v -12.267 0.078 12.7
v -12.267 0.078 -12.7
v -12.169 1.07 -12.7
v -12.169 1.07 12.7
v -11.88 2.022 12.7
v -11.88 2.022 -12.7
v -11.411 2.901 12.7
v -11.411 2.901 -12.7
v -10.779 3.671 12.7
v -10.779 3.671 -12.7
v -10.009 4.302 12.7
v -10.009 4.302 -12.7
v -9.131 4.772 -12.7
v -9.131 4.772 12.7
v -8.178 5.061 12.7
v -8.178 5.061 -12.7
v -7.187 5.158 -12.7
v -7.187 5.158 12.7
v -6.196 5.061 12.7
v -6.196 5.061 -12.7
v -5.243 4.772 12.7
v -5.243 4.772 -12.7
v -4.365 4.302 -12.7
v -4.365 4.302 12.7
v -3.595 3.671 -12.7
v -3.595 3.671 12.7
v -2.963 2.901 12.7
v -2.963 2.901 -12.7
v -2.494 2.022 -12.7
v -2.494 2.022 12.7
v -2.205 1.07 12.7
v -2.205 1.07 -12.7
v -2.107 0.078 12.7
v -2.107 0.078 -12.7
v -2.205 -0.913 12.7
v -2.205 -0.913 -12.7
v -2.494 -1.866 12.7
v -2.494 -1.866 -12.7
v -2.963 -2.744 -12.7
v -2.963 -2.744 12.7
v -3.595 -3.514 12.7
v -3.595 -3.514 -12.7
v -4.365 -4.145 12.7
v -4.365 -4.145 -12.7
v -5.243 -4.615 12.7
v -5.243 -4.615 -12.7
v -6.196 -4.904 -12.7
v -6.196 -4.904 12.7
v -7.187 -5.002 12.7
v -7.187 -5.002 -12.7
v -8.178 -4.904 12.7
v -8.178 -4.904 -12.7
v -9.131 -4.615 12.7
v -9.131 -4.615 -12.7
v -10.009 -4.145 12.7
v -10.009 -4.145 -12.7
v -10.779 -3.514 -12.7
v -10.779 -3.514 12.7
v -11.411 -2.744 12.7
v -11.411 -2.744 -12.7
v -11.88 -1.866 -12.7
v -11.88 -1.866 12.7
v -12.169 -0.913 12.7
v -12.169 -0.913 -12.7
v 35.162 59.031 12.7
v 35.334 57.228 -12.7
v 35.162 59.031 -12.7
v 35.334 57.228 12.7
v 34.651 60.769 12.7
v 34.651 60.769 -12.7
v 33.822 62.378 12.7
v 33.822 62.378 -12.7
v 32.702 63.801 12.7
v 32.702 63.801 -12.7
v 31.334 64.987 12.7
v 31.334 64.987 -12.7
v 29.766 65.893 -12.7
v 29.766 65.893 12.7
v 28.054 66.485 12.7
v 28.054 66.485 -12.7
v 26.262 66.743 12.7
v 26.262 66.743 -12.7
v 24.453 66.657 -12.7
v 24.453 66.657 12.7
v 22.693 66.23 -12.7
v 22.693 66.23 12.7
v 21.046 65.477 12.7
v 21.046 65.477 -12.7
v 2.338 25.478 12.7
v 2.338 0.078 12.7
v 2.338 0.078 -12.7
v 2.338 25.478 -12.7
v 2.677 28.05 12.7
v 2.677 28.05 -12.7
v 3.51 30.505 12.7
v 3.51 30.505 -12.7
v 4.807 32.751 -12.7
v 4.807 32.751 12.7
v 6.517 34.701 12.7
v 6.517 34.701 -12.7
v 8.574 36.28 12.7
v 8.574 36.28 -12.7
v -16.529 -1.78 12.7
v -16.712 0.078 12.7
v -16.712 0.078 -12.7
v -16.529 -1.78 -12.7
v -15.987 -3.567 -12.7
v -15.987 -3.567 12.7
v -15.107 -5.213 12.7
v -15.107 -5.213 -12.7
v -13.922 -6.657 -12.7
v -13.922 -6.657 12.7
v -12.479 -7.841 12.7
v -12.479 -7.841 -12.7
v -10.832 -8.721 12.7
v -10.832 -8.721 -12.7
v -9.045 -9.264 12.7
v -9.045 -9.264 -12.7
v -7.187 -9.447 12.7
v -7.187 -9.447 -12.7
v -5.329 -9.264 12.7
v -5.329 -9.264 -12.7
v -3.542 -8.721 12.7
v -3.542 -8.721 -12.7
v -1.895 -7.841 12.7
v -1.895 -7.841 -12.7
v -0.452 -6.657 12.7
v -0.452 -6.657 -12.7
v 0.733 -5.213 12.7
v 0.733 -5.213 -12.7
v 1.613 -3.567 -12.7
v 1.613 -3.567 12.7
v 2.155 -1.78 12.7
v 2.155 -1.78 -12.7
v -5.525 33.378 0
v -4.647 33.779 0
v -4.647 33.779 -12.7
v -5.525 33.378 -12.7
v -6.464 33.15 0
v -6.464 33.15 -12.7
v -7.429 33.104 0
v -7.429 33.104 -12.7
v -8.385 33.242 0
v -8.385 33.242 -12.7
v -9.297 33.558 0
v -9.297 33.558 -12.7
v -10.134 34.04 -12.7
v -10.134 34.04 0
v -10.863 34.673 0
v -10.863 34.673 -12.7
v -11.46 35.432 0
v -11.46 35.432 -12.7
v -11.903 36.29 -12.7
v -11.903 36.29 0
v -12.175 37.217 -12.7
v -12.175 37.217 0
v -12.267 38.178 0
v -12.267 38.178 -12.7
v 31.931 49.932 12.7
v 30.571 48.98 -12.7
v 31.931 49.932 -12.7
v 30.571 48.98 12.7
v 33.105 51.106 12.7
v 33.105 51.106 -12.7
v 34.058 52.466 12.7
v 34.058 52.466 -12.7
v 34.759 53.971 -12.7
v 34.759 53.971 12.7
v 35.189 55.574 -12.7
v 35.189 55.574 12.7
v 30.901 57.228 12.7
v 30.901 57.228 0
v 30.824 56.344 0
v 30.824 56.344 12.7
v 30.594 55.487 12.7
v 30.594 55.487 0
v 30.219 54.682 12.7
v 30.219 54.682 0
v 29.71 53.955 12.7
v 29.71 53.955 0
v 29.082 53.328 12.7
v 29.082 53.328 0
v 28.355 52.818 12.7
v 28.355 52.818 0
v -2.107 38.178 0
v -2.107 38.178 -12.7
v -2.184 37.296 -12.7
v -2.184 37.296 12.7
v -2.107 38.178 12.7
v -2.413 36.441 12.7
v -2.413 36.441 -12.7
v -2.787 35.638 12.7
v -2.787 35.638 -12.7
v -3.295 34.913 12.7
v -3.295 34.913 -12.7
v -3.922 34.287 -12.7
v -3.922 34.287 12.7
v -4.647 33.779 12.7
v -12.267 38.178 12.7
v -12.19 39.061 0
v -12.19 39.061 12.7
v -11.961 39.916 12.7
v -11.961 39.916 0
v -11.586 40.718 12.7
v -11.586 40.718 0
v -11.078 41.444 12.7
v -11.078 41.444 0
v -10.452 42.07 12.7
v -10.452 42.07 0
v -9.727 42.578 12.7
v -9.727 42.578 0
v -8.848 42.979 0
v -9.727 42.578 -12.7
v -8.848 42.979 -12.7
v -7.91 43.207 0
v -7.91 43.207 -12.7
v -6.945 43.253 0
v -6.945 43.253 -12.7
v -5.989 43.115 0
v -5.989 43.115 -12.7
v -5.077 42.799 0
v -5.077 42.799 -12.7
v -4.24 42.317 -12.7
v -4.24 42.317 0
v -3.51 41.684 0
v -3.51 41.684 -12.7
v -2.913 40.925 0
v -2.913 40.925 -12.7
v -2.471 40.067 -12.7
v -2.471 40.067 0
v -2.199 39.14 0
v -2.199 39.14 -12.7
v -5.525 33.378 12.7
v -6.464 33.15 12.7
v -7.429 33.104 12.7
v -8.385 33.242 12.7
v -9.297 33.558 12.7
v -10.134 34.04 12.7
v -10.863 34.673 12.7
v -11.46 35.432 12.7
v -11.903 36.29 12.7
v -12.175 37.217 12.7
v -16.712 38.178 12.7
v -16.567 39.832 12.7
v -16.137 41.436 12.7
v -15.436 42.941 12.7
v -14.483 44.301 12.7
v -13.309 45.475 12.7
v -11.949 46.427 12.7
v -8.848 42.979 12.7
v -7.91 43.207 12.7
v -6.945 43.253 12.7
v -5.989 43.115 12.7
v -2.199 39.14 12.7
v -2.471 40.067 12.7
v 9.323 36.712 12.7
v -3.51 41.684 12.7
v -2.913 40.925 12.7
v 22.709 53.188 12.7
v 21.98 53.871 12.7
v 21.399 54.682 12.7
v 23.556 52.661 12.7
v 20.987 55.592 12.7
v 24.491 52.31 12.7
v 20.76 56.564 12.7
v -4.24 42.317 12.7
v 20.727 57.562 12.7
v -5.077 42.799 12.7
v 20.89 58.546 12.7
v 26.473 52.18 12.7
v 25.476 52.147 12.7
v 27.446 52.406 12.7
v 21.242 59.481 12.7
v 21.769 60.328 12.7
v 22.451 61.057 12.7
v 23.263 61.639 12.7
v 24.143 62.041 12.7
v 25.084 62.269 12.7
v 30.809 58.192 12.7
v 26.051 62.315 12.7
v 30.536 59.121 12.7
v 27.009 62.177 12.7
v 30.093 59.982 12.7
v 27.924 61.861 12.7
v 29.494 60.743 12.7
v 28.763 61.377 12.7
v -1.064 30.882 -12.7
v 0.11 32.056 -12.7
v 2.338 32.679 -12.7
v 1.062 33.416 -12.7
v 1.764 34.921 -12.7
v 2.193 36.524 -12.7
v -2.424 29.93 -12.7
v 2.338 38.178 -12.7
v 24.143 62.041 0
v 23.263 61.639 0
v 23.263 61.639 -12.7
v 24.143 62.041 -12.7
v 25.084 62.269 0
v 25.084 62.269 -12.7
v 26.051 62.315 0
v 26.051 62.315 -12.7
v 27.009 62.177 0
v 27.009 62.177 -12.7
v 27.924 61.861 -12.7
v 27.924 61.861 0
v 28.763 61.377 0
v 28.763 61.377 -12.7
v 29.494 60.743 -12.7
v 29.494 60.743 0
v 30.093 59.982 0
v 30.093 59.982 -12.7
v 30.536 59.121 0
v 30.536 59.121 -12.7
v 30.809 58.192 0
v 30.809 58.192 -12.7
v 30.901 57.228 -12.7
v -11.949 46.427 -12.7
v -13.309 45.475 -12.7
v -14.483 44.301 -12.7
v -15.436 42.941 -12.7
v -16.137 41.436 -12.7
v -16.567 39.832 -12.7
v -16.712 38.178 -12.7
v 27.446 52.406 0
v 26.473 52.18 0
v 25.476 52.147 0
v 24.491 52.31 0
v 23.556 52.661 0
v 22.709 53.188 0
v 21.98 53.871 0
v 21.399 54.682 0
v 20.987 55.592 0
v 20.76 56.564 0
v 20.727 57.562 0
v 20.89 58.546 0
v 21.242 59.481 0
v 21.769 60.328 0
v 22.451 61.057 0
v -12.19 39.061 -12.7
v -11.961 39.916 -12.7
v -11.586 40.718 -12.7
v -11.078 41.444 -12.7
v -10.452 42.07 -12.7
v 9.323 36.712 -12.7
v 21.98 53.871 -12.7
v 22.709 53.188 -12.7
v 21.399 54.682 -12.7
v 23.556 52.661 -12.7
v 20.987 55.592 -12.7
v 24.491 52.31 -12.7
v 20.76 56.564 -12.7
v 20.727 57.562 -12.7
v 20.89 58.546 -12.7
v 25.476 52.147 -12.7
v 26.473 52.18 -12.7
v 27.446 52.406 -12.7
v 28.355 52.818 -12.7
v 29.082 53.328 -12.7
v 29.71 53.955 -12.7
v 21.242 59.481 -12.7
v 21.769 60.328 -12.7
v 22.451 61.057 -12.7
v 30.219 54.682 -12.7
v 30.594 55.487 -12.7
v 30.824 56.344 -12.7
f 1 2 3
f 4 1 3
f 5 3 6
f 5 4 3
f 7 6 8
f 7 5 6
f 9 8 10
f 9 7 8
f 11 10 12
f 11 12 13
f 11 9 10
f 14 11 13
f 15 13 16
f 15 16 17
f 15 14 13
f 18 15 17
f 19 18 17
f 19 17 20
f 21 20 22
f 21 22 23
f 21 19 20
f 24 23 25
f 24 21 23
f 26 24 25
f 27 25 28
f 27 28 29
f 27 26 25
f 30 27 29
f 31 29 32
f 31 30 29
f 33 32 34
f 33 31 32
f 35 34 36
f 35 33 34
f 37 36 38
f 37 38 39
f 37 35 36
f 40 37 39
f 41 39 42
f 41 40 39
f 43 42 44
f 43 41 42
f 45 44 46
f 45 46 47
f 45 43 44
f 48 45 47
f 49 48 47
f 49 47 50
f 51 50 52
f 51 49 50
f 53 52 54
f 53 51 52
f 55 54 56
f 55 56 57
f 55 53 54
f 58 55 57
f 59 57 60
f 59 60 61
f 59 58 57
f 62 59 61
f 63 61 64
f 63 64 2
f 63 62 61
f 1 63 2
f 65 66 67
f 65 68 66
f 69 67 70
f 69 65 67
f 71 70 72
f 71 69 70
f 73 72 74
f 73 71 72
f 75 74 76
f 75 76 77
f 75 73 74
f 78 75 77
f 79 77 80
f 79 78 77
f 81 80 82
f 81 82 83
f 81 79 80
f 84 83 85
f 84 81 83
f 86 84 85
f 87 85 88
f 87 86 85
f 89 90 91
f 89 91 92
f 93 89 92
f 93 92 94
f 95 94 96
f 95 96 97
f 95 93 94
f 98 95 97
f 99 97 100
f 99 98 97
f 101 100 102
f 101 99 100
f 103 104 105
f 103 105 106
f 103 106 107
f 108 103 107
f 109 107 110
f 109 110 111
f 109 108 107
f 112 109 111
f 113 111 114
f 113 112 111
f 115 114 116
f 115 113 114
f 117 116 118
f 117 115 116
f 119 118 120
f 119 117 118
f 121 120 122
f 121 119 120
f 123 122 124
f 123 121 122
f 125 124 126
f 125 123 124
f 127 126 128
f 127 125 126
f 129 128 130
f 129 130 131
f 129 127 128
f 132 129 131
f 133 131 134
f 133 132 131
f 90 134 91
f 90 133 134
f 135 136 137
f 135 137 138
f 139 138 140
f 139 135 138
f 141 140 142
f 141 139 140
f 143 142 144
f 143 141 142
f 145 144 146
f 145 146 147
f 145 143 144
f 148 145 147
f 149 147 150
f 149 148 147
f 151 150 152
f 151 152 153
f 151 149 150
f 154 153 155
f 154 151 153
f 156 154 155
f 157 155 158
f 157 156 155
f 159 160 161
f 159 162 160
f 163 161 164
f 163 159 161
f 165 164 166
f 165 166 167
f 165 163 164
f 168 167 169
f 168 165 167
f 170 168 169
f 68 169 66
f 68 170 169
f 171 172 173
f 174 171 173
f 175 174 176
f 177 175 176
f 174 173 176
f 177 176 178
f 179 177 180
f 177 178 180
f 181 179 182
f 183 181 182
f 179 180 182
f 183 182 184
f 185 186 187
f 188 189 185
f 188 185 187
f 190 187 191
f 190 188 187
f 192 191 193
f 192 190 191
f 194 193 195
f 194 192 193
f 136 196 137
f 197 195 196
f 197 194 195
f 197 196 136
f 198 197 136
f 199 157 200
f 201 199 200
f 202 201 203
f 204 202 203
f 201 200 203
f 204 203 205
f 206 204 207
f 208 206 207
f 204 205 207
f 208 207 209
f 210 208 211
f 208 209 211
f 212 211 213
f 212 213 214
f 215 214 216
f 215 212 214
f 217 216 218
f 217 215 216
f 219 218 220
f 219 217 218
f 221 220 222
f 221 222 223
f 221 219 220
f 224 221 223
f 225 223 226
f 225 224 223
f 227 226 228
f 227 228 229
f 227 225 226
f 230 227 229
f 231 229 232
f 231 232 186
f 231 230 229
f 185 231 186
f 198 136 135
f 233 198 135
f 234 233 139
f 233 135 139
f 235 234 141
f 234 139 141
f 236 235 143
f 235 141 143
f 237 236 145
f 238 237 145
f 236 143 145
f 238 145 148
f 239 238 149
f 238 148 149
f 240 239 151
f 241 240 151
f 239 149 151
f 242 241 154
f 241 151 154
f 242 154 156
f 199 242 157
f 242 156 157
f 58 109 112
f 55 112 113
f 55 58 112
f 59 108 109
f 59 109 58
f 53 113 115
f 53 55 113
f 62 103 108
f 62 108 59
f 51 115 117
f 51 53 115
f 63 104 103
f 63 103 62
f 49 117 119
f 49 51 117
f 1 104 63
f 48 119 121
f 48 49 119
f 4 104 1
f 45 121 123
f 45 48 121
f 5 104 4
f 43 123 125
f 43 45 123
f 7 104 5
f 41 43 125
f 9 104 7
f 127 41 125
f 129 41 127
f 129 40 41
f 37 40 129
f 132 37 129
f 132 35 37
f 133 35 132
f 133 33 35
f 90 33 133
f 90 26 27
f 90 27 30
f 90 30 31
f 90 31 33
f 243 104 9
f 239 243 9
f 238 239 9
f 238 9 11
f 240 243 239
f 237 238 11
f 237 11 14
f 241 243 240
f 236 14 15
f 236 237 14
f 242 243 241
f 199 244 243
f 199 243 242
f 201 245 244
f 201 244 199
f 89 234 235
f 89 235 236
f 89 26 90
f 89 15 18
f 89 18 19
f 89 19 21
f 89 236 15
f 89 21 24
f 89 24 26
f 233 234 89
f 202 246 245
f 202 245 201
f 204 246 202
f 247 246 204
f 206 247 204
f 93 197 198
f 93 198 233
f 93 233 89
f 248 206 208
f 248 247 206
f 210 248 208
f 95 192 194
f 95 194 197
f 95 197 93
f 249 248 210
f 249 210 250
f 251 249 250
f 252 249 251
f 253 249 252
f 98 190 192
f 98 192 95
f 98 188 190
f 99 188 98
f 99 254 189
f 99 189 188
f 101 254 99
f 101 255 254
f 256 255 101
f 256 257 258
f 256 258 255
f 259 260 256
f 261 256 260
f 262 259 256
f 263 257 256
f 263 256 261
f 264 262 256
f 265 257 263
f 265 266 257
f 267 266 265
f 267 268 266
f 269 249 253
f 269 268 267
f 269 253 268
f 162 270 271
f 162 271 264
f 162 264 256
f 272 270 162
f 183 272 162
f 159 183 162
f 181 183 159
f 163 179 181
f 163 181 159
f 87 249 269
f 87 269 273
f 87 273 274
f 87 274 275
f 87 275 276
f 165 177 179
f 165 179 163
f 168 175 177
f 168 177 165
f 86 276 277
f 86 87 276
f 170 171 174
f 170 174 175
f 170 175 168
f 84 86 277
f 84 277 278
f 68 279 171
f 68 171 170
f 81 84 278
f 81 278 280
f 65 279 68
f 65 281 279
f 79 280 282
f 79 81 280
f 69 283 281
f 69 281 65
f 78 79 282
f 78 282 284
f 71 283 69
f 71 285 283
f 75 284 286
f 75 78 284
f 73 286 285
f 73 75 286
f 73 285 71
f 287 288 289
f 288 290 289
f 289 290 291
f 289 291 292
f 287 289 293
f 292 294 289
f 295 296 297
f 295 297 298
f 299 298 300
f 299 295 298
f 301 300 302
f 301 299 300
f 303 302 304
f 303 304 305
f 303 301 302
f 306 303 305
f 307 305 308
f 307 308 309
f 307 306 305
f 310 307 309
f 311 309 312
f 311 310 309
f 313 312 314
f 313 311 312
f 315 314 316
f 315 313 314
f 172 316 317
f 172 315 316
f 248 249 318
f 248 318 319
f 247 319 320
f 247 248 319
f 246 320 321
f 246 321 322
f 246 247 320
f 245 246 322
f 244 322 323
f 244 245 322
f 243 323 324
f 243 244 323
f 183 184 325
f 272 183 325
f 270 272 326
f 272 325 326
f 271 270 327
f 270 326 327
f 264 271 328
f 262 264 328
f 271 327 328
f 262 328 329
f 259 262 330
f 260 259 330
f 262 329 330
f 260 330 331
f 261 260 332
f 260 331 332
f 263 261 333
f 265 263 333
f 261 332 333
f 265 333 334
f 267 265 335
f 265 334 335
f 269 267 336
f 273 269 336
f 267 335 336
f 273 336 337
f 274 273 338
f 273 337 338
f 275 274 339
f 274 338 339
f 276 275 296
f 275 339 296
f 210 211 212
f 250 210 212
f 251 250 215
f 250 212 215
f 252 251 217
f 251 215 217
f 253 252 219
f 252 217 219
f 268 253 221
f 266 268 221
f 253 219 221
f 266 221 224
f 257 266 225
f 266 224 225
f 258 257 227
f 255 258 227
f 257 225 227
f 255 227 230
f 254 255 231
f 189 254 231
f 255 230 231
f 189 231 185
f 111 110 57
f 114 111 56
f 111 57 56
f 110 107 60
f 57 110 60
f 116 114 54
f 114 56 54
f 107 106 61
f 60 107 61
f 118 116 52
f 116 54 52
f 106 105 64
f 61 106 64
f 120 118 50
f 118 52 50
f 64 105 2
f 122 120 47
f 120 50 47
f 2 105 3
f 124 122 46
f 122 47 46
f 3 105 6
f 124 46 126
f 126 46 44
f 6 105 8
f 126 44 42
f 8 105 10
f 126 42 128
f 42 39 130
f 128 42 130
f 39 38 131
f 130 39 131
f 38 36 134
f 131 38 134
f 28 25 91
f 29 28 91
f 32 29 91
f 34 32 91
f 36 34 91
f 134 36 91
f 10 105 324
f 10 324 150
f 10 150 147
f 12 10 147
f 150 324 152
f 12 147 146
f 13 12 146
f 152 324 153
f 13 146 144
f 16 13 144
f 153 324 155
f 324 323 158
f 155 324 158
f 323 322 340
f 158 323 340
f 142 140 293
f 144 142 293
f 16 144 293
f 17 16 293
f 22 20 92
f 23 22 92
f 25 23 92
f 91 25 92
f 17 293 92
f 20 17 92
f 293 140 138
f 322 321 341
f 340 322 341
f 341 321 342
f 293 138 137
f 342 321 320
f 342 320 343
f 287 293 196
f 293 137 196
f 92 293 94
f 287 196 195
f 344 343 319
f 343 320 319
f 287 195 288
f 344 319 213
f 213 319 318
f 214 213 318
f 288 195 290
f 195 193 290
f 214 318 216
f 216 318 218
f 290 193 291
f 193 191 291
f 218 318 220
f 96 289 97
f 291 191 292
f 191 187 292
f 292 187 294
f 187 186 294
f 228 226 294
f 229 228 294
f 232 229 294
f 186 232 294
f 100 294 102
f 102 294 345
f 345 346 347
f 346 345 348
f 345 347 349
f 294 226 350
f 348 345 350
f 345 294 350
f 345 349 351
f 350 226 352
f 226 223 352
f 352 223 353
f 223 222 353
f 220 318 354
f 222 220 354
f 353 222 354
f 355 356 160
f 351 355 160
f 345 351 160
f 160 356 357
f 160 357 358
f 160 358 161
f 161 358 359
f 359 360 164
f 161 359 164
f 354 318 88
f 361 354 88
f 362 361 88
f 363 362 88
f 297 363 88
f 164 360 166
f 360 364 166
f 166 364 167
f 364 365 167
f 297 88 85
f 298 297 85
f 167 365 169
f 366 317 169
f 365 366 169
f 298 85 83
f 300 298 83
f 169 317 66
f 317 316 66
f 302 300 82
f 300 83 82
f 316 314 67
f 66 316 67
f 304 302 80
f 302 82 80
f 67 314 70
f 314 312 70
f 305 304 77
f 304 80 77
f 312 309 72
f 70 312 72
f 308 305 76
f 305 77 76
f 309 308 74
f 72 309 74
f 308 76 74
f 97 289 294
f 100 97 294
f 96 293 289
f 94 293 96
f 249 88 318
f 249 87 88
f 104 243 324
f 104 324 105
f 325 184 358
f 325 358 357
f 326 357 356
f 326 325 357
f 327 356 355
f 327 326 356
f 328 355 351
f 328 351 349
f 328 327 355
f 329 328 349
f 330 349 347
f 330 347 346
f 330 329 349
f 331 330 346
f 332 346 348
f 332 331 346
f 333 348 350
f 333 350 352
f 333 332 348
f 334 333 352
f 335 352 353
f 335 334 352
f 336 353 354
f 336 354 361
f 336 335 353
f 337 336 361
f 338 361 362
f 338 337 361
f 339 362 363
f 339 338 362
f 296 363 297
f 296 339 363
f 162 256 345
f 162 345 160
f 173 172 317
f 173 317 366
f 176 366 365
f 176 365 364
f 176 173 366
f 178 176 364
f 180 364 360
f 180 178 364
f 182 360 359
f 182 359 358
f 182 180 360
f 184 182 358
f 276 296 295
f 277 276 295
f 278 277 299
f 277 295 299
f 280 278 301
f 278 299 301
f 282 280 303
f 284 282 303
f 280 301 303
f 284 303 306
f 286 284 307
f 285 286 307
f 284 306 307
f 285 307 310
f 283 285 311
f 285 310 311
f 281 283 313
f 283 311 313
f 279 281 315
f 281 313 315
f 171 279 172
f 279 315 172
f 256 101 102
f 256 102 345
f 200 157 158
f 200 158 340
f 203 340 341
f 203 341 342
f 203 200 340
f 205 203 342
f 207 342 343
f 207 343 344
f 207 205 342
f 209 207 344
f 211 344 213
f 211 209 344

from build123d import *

# Parameters (mm, degrees)
F1_DEPTH = 12.7
F2_DEPTH = 12.7
F3_DEPTH = 12.7


with BuildPart() as f1:
    # F0 (on Top) → F1 (new body, symmetric)
    with BuildSketch(Plane.XY):
        with BuildLine():
            ThreePointArc((-16.7118934188, 0.0784563937), (-7.1868934188, -9.4465436063), (2.3381065812, 0.0784563937))
            Line((2.3381065812, 0.0784563937), (-2.1068934188, 0.0784563937))
            ThreePointArc((-2.1068934188, 0.0784563937), (-7.1868934188, -5.0015436063), (-12.2668934188, 0.0784563937))
            Line((-12.2668934188, 0.0784563937), (-16.7118934188, 0.0784563937))
        make_face()
        with BuildLine():
            ThreePointArc((-16.7118934188, 0.0784563937), (-7.1868934188, 9.6034563937), (2.3381065812, 0.0784563937))
            Line((2.3381065812, 0.0784563937), (2.3381065812, 24.6140933614))
            ThreePointArc((2.3381065812, 24.6140933614), (2.3310444619, 25.0462748775), (2.3381065812, 25.4784563937))
            Line((2.3381065812, 25.4784563937), (2.3381065812, 32.6791950797))
            Line((2.3381065812, 32.6791950797), (-2.4243934188, 29.9295644226))
            ThreePointArc((-2.4243934188, 29.9295644226), (-11.9493934188, 29.9295644226), (-16.7118934188, 38.1784563937))
            Line((-16.7118934188, 38.1784563937), (-16.7118934188, 0.0784563937))
        make_face()
        with BuildLine():
            Line((-2.1068934188, 0.0784563937), (2.3381065812, 0.0784563937))
            ThreePointArc((2.3381065812, 0.0784563937), (-7.1868934188, 9.6034563937), (-16.7118934188, 0.0784563937))
            Line((-16.7118934188, 0.0784563937), (-12.2668934188, 0.0784563937))
            ThreePointArc((-12.2668934188, 0.0784563937), (-7.1868934188, 5.1584563937), (-2.1068934188, 0.0784563937))
        make_face()
        with BuildLine():
            ThreePointArc((2.3381065812, 25.4784563937), (2.3310444619, 25.0462748775), (2.3381065812, 24.6140933614))
            Line((2.3381065812, 24.6140933614), (2.3381065812, 25.4784563937))
        make_face()
        with BuildLine():
            Line((2.3381065812, 32.6791950797), (2.3381065812, 25.4784563937))
            ThreePointArc((2.3381065812, 25.4784563937), (4.1032159035, 31.6601087373), (8.5741292093, 36.2795644226))
            Line((8.5741292093, 36.2795644226), (2.3381065812, 32.6791950797))
        make_face()
        with BuildLine():
            ThreePointArc((-11.9493934188, 46.4273483647), (-15.4357853898, 42.9409563937), (-16.7118934188, 38.1784563937))
            Line((-16.7118934188, 38.1784563937), (-12.2668934188, 38.1784563937))
            ThreePointArc((-12.2668934188, 38.1784563937), (-11.58630247, 40.7184563937), (-9.7268934188, 42.5778654449))
            Line((-9.7268934188, 42.5778654449), (-11.9493934188, 46.4273483647))
        make_face()
        with BuildLine():
            Line((-12.2668934188, 38.1784563937), (-16.7118934188, 38.1784563937))
            ThreePointArc((-16.7118934188, 38.1784563937), (-11.9493934188, 29.9295644226), (-2.4243934188, 29.9295644226))
            Line((-2.4243934188, 29.9295644226), (-4.6468934188, 33.7790473425))
            ThreePointArc((-4.6468934188, 33.7790473425), (-9.7268934188, 33.7790473425), (-12.2668934188, 38.1784563937))
        make_face()
        with BuildLine():
            Line((2.3381065812, 38.1784563937), (2.3381065812, 32.6791950797))
            Line((2.3381065812, 32.6791950797), (8.5741292093, 36.2795644226))
            ThreePointArc((8.5741292093, 36.2795644226), (8.9448783217, 36.5017711555), (9.3226895534, 36.7117459388))
            Line((9.3226895534, 36.7117459388), (30.5711744654, 48.9795644226))
            ThreePointArc((30.5711744654, 48.9795644226), (17.5597824944, 52.4659563937), (21.0461744654, 65.4773483647))
            Line((21.0461744654, 65.4773483647), (-11.9493934188, 46.4273483647))
            ThreePointArc((-11.9493934188, 46.4273483647), (-2.4243934188, 46.4273483647), (2.3381065812, 38.1784563937))
        make_face()
        with BuildLine():
            ThreePointArc((9.3226895534, 36.7117459388), (8.9448783217, 36.5017711555), (8.5741292093, 36.2795644226))
            Line((8.5741292093, 36.2795644226), (9.3226895534, 36.7117459388))
        make_face()
        with BuildLine():
            ThreePointArc((2.3381065812, 38.1784563937), (-2.4243934188, 46.4273483647), (-11.9493934188, 46.4273483647))
            Line((-11.9493934188, 46.4273483647), (-9.7268934188, 42.5778654449))
            ThreePointArc((-9.7268934188, 42.5778654449), (-4.6468934188, 42.5778654449), (-2.1068934188, 38.1784563937))
            Line((-2.1068934188, 38.1784563937), (2.3381065812, 38.1784563937))
        make_face()
        with BuildLine():
            ThreePointArc((35.3336744654, 57.2284563937), (30.5711744654, 65.4773483647), (21.0461744654, 65.4773483647))
            Line((21.0461744654, 65.4773483647), (23.2625173508, 61.6385298803))
            ThreePointArc((23.2625173508, 61.6385298803), (28.3548315801, 61.6385298803), (30.9009886947, 57.2284563937))
            ThreePointArc((30.9009886947, 57.2284563937), (30.218747952, 54.6822992791), (28.3548315801, 52.8183829071))
            Line((28.3548315801, 52.8183829071), (30.5711744654, 48.9795644226))
            ThreePointArc((30.5711744654, 48.9795644226), (34.0575664365, 52.4659563937), (35.3336744654, 57.2284563937))
        make_face()
        with BuildLine():
            Line((23.2625173508, 61.6385298803), (21.0461744654, 65.4773483647))
            ThreePointArc((21.0461744654, 65.4773483647), (17.5597824944, 52.4659563937), (30.5711744654, 48.9795644226))
            Line((30.5711744654, 48.9795644226), (28.3548315801, 52.8183829071))
            ThreePointArc((28.3548315801, 52.8183829071), (21.3986009788, 54.6822992791), (23.2625173508, 61.6385298803))
        make_face()
    extrude(amount=F1_DEPTH, both=True)

    # F0 (on Top) → F2 (join, symmetric)
    with BuildSketch(Plane.XY):
        with BuildLine():
            Line((-4.6468934188, 33.7790473425), (-2.4243934188, 29.9295644226))
            ThreePointArc((-2.4243934188, 29.9295644226), (1.0619985523, 33.4159563937), (2.3381065812, 38.1784563937))
            Line((2.3381065812, 38.1784563937), (-2.1068934188, 38.1784563937))
            ThreePointArc((-2.1068934188, 38.1784563937), (-2.7874843675, 35.6384563937), (-4.6468934188, 33.7790473425))
        make_face()
    extrude(amount=F2_DEPTH, both=True)

    # F0 (on Top) → F3 (join, symmetric)
    with BuildSketch(Plane.XY):
        with BuildLine():
            Line((-2.4243934188, 29.9295644226), (2.3381065812, 32.6791950797))
            Line((2.3381065812, 32.6791950797), (2.3381065812, 38.1784563937))
            ThreePointArc((2.3381065812, 38.1784563937), (1.0619985523, 33.4159563937), (-2.4243934188, 29.9295644226))
        make_face()
    extrude(amount=F3_DEPTH, both=True)


solid = f1.part
